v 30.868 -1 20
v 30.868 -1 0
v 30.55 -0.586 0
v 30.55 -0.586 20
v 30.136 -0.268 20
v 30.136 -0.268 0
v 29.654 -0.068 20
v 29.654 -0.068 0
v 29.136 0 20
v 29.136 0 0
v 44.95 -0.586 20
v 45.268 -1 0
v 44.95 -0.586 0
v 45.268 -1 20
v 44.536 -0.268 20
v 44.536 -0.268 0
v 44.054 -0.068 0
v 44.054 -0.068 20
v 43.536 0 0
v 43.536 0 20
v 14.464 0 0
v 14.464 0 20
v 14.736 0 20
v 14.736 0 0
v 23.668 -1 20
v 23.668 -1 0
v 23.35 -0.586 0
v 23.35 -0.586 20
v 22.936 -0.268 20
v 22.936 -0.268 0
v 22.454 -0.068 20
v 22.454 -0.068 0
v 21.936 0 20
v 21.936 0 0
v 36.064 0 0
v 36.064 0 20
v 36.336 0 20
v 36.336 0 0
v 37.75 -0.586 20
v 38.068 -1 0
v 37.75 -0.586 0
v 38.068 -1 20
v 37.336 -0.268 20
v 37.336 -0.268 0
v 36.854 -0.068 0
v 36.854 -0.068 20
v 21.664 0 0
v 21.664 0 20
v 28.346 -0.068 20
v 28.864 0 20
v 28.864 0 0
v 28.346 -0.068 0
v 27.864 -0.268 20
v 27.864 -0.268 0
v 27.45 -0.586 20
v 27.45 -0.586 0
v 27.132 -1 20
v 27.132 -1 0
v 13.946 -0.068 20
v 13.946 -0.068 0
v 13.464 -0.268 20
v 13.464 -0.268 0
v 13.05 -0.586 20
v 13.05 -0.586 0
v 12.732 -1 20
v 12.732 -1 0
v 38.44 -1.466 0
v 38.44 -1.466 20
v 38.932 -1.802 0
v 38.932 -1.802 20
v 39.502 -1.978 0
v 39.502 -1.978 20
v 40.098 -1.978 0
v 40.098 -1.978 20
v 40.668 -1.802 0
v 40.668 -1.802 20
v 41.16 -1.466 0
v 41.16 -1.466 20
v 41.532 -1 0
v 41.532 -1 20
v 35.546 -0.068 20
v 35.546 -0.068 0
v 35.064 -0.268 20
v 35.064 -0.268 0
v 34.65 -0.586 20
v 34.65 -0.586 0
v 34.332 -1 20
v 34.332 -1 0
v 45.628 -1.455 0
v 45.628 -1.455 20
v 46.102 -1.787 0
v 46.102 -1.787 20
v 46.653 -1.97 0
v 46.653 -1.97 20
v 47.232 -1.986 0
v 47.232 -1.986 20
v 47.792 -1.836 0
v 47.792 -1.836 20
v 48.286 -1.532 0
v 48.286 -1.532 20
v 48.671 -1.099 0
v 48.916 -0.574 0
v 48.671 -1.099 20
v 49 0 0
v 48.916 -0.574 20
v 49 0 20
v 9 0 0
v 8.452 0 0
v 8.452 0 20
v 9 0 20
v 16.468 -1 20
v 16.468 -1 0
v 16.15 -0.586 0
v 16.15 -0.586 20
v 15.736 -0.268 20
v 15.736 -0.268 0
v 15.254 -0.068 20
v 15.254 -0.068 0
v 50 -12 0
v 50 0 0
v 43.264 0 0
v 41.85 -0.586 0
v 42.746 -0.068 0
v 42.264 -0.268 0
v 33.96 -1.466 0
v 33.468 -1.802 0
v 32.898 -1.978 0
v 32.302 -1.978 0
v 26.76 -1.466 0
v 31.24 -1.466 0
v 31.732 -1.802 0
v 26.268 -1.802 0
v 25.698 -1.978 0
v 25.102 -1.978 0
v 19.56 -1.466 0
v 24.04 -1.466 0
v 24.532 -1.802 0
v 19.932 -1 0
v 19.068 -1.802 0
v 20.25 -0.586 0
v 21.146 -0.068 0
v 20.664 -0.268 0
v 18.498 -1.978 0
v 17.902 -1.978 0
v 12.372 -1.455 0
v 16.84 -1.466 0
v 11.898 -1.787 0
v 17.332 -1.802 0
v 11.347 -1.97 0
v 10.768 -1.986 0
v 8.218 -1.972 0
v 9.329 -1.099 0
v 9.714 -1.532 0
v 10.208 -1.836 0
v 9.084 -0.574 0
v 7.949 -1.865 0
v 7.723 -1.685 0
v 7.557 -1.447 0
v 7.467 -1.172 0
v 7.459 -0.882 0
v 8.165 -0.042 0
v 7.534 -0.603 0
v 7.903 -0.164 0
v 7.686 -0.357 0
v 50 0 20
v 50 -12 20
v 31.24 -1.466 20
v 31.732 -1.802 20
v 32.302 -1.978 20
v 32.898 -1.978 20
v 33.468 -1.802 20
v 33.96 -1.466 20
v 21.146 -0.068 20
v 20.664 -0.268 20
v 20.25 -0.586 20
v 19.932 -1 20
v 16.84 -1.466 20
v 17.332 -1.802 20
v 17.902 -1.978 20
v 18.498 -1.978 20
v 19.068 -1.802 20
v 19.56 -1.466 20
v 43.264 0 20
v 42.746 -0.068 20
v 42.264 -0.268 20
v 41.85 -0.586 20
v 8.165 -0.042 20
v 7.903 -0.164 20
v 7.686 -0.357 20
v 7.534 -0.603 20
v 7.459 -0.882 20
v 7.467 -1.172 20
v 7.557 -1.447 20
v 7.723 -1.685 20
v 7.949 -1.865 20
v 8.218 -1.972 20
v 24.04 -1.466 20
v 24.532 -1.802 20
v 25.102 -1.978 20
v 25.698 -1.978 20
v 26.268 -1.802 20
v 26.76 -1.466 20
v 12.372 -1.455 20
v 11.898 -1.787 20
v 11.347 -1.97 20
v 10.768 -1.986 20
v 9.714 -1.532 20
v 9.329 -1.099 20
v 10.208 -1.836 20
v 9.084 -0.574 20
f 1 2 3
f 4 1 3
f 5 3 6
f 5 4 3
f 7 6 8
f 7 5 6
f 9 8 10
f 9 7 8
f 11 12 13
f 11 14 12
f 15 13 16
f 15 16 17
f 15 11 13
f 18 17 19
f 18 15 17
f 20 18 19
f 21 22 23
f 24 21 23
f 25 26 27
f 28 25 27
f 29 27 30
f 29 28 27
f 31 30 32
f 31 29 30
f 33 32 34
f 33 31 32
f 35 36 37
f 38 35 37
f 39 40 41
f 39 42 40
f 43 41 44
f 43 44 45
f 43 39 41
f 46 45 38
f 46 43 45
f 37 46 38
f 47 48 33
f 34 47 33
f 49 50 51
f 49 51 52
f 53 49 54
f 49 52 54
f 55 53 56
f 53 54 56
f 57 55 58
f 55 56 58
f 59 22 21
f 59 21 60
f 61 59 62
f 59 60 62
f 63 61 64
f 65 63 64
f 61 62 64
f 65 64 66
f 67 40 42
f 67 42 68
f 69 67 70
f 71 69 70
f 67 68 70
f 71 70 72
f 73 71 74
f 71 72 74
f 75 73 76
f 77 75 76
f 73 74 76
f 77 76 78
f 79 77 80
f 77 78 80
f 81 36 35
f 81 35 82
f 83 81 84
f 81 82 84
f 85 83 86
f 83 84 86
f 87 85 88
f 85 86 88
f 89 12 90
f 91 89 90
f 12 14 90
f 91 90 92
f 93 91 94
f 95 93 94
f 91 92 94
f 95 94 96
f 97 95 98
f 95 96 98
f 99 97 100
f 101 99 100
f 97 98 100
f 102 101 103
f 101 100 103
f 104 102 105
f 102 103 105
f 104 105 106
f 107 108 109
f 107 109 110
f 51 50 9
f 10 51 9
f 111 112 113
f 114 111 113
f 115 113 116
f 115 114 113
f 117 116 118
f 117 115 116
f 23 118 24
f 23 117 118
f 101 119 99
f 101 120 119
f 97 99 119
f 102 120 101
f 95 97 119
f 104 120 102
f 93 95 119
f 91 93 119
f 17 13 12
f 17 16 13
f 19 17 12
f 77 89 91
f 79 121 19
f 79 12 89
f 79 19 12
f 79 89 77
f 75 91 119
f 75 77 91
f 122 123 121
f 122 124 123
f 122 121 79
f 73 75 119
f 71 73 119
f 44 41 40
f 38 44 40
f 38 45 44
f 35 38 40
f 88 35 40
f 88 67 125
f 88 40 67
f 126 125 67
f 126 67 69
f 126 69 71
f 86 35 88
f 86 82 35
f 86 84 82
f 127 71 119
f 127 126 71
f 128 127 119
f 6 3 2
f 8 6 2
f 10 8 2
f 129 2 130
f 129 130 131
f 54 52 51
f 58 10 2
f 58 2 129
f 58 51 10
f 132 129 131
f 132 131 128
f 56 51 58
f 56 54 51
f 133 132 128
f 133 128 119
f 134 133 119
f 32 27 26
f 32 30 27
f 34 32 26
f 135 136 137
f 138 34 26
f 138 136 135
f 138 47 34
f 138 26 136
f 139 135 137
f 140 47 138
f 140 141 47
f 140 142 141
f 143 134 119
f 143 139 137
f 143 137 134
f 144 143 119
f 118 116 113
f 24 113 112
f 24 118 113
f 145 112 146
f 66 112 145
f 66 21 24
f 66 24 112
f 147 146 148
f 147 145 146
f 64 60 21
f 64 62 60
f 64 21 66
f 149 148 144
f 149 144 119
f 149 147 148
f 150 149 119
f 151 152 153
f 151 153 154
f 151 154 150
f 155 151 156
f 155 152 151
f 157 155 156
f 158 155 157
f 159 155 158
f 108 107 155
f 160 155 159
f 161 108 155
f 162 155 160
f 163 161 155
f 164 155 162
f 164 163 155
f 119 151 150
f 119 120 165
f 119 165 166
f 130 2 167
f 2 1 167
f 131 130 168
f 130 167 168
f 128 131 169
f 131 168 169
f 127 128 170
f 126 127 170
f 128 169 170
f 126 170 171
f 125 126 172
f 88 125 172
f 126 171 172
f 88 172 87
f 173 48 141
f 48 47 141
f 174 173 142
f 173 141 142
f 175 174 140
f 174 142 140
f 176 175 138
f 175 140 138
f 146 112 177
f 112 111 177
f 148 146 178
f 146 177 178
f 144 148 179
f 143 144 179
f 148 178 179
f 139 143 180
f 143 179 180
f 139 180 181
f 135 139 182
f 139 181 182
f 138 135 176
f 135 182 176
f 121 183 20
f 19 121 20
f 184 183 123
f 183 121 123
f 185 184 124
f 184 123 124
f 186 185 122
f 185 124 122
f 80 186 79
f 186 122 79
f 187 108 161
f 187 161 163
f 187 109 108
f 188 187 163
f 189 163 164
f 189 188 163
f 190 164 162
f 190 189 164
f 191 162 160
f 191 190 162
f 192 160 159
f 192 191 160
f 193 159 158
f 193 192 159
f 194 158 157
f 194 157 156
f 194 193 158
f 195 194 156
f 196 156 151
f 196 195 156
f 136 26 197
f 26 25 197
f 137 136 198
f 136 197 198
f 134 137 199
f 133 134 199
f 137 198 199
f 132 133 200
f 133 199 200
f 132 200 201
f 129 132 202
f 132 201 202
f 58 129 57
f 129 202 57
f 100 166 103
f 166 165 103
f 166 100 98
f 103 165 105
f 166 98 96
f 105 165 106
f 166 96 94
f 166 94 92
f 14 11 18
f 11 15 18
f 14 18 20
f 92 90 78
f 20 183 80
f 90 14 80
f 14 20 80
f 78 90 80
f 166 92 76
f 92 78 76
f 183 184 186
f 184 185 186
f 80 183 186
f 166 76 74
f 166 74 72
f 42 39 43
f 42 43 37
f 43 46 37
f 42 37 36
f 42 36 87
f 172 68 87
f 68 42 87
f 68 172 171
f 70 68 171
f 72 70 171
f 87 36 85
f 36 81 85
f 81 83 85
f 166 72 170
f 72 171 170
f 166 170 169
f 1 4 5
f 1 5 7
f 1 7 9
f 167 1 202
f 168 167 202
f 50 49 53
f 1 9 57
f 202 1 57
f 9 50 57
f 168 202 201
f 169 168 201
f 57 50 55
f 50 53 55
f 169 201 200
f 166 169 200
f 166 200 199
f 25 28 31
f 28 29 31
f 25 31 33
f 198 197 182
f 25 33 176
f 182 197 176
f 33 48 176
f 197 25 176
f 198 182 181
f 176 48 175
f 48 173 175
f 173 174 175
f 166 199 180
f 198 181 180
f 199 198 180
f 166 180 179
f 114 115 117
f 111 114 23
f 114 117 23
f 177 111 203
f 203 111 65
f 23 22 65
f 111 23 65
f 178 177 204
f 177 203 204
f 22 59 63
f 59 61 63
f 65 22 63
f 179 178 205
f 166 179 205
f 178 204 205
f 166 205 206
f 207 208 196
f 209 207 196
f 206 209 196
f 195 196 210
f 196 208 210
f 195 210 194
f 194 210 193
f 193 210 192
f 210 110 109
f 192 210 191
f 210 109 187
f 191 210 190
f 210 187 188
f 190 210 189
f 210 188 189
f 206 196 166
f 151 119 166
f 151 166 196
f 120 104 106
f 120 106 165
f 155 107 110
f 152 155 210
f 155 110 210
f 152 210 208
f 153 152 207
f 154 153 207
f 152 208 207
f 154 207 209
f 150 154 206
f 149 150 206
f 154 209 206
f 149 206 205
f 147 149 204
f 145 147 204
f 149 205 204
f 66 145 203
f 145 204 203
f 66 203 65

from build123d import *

# Parameters (mm, degrees)
PAD_DEPTH           = 20
FILLET_R            = 1
SKETCH001_R         = 2
POCKET_DEPTH        = 20.001
LINEARPATTERN_COUNT = 6
LINEARPATTERN_PITCH = 7.2
FILLET001_R         = 2


with BuildPart() as part:
    # Sketch → Pad (new body)
    with BuildSketch(Plane.XY):
        Polygon((0, 0), (50, 0), (50, -12), align=None)
    extrude(amount=PAD_DEPTH)

    # Fillet
    fillet_edges = [part.edges().sort_by_distance(p)[0] for p in [
        (0, 0, 10),
    ]]
    fillet(fillet_edges, radius=FILLET_R)

    # Sketch001 (on Face5 of Fillet) → Pocket (cut, through all)
    with BuildSketch(Plane.XY.offset(20)):
        with Locations((47, 0)):
            Circle(SKETCH001_R)
    pocket = extrude(amount=-POCKET_DEPTH, mode=Mode.SUBTRACT)

    # LinearPattern: Pocket ×6
    with Locations(*[(-i * LINEARPATTERN_PITCH, 0, 0) for i in range(1, LINEARPATTERN_COUNT)]):
        add(pocket, mode=Mode.SUBTRACT)

    # Fillet001
    fillet001_edges = [part.edges().sort_by_distance(p)[0] for p in [
        (13, 0, 10),
        (16.2, 0, 10),
        (20.2, 0, 10),
        (23.4, 0, 10),
        (27.4, 0, 10),
        (30.6, 0, 10),
        (34.6, 0, 10),
        (37.8, 0, 10),
        (41.8, 0, 10),
        (45, 0, 10),
    ]]
    fillet(fillet001_edges, radius=FILLET001_R)


solid = part.part
